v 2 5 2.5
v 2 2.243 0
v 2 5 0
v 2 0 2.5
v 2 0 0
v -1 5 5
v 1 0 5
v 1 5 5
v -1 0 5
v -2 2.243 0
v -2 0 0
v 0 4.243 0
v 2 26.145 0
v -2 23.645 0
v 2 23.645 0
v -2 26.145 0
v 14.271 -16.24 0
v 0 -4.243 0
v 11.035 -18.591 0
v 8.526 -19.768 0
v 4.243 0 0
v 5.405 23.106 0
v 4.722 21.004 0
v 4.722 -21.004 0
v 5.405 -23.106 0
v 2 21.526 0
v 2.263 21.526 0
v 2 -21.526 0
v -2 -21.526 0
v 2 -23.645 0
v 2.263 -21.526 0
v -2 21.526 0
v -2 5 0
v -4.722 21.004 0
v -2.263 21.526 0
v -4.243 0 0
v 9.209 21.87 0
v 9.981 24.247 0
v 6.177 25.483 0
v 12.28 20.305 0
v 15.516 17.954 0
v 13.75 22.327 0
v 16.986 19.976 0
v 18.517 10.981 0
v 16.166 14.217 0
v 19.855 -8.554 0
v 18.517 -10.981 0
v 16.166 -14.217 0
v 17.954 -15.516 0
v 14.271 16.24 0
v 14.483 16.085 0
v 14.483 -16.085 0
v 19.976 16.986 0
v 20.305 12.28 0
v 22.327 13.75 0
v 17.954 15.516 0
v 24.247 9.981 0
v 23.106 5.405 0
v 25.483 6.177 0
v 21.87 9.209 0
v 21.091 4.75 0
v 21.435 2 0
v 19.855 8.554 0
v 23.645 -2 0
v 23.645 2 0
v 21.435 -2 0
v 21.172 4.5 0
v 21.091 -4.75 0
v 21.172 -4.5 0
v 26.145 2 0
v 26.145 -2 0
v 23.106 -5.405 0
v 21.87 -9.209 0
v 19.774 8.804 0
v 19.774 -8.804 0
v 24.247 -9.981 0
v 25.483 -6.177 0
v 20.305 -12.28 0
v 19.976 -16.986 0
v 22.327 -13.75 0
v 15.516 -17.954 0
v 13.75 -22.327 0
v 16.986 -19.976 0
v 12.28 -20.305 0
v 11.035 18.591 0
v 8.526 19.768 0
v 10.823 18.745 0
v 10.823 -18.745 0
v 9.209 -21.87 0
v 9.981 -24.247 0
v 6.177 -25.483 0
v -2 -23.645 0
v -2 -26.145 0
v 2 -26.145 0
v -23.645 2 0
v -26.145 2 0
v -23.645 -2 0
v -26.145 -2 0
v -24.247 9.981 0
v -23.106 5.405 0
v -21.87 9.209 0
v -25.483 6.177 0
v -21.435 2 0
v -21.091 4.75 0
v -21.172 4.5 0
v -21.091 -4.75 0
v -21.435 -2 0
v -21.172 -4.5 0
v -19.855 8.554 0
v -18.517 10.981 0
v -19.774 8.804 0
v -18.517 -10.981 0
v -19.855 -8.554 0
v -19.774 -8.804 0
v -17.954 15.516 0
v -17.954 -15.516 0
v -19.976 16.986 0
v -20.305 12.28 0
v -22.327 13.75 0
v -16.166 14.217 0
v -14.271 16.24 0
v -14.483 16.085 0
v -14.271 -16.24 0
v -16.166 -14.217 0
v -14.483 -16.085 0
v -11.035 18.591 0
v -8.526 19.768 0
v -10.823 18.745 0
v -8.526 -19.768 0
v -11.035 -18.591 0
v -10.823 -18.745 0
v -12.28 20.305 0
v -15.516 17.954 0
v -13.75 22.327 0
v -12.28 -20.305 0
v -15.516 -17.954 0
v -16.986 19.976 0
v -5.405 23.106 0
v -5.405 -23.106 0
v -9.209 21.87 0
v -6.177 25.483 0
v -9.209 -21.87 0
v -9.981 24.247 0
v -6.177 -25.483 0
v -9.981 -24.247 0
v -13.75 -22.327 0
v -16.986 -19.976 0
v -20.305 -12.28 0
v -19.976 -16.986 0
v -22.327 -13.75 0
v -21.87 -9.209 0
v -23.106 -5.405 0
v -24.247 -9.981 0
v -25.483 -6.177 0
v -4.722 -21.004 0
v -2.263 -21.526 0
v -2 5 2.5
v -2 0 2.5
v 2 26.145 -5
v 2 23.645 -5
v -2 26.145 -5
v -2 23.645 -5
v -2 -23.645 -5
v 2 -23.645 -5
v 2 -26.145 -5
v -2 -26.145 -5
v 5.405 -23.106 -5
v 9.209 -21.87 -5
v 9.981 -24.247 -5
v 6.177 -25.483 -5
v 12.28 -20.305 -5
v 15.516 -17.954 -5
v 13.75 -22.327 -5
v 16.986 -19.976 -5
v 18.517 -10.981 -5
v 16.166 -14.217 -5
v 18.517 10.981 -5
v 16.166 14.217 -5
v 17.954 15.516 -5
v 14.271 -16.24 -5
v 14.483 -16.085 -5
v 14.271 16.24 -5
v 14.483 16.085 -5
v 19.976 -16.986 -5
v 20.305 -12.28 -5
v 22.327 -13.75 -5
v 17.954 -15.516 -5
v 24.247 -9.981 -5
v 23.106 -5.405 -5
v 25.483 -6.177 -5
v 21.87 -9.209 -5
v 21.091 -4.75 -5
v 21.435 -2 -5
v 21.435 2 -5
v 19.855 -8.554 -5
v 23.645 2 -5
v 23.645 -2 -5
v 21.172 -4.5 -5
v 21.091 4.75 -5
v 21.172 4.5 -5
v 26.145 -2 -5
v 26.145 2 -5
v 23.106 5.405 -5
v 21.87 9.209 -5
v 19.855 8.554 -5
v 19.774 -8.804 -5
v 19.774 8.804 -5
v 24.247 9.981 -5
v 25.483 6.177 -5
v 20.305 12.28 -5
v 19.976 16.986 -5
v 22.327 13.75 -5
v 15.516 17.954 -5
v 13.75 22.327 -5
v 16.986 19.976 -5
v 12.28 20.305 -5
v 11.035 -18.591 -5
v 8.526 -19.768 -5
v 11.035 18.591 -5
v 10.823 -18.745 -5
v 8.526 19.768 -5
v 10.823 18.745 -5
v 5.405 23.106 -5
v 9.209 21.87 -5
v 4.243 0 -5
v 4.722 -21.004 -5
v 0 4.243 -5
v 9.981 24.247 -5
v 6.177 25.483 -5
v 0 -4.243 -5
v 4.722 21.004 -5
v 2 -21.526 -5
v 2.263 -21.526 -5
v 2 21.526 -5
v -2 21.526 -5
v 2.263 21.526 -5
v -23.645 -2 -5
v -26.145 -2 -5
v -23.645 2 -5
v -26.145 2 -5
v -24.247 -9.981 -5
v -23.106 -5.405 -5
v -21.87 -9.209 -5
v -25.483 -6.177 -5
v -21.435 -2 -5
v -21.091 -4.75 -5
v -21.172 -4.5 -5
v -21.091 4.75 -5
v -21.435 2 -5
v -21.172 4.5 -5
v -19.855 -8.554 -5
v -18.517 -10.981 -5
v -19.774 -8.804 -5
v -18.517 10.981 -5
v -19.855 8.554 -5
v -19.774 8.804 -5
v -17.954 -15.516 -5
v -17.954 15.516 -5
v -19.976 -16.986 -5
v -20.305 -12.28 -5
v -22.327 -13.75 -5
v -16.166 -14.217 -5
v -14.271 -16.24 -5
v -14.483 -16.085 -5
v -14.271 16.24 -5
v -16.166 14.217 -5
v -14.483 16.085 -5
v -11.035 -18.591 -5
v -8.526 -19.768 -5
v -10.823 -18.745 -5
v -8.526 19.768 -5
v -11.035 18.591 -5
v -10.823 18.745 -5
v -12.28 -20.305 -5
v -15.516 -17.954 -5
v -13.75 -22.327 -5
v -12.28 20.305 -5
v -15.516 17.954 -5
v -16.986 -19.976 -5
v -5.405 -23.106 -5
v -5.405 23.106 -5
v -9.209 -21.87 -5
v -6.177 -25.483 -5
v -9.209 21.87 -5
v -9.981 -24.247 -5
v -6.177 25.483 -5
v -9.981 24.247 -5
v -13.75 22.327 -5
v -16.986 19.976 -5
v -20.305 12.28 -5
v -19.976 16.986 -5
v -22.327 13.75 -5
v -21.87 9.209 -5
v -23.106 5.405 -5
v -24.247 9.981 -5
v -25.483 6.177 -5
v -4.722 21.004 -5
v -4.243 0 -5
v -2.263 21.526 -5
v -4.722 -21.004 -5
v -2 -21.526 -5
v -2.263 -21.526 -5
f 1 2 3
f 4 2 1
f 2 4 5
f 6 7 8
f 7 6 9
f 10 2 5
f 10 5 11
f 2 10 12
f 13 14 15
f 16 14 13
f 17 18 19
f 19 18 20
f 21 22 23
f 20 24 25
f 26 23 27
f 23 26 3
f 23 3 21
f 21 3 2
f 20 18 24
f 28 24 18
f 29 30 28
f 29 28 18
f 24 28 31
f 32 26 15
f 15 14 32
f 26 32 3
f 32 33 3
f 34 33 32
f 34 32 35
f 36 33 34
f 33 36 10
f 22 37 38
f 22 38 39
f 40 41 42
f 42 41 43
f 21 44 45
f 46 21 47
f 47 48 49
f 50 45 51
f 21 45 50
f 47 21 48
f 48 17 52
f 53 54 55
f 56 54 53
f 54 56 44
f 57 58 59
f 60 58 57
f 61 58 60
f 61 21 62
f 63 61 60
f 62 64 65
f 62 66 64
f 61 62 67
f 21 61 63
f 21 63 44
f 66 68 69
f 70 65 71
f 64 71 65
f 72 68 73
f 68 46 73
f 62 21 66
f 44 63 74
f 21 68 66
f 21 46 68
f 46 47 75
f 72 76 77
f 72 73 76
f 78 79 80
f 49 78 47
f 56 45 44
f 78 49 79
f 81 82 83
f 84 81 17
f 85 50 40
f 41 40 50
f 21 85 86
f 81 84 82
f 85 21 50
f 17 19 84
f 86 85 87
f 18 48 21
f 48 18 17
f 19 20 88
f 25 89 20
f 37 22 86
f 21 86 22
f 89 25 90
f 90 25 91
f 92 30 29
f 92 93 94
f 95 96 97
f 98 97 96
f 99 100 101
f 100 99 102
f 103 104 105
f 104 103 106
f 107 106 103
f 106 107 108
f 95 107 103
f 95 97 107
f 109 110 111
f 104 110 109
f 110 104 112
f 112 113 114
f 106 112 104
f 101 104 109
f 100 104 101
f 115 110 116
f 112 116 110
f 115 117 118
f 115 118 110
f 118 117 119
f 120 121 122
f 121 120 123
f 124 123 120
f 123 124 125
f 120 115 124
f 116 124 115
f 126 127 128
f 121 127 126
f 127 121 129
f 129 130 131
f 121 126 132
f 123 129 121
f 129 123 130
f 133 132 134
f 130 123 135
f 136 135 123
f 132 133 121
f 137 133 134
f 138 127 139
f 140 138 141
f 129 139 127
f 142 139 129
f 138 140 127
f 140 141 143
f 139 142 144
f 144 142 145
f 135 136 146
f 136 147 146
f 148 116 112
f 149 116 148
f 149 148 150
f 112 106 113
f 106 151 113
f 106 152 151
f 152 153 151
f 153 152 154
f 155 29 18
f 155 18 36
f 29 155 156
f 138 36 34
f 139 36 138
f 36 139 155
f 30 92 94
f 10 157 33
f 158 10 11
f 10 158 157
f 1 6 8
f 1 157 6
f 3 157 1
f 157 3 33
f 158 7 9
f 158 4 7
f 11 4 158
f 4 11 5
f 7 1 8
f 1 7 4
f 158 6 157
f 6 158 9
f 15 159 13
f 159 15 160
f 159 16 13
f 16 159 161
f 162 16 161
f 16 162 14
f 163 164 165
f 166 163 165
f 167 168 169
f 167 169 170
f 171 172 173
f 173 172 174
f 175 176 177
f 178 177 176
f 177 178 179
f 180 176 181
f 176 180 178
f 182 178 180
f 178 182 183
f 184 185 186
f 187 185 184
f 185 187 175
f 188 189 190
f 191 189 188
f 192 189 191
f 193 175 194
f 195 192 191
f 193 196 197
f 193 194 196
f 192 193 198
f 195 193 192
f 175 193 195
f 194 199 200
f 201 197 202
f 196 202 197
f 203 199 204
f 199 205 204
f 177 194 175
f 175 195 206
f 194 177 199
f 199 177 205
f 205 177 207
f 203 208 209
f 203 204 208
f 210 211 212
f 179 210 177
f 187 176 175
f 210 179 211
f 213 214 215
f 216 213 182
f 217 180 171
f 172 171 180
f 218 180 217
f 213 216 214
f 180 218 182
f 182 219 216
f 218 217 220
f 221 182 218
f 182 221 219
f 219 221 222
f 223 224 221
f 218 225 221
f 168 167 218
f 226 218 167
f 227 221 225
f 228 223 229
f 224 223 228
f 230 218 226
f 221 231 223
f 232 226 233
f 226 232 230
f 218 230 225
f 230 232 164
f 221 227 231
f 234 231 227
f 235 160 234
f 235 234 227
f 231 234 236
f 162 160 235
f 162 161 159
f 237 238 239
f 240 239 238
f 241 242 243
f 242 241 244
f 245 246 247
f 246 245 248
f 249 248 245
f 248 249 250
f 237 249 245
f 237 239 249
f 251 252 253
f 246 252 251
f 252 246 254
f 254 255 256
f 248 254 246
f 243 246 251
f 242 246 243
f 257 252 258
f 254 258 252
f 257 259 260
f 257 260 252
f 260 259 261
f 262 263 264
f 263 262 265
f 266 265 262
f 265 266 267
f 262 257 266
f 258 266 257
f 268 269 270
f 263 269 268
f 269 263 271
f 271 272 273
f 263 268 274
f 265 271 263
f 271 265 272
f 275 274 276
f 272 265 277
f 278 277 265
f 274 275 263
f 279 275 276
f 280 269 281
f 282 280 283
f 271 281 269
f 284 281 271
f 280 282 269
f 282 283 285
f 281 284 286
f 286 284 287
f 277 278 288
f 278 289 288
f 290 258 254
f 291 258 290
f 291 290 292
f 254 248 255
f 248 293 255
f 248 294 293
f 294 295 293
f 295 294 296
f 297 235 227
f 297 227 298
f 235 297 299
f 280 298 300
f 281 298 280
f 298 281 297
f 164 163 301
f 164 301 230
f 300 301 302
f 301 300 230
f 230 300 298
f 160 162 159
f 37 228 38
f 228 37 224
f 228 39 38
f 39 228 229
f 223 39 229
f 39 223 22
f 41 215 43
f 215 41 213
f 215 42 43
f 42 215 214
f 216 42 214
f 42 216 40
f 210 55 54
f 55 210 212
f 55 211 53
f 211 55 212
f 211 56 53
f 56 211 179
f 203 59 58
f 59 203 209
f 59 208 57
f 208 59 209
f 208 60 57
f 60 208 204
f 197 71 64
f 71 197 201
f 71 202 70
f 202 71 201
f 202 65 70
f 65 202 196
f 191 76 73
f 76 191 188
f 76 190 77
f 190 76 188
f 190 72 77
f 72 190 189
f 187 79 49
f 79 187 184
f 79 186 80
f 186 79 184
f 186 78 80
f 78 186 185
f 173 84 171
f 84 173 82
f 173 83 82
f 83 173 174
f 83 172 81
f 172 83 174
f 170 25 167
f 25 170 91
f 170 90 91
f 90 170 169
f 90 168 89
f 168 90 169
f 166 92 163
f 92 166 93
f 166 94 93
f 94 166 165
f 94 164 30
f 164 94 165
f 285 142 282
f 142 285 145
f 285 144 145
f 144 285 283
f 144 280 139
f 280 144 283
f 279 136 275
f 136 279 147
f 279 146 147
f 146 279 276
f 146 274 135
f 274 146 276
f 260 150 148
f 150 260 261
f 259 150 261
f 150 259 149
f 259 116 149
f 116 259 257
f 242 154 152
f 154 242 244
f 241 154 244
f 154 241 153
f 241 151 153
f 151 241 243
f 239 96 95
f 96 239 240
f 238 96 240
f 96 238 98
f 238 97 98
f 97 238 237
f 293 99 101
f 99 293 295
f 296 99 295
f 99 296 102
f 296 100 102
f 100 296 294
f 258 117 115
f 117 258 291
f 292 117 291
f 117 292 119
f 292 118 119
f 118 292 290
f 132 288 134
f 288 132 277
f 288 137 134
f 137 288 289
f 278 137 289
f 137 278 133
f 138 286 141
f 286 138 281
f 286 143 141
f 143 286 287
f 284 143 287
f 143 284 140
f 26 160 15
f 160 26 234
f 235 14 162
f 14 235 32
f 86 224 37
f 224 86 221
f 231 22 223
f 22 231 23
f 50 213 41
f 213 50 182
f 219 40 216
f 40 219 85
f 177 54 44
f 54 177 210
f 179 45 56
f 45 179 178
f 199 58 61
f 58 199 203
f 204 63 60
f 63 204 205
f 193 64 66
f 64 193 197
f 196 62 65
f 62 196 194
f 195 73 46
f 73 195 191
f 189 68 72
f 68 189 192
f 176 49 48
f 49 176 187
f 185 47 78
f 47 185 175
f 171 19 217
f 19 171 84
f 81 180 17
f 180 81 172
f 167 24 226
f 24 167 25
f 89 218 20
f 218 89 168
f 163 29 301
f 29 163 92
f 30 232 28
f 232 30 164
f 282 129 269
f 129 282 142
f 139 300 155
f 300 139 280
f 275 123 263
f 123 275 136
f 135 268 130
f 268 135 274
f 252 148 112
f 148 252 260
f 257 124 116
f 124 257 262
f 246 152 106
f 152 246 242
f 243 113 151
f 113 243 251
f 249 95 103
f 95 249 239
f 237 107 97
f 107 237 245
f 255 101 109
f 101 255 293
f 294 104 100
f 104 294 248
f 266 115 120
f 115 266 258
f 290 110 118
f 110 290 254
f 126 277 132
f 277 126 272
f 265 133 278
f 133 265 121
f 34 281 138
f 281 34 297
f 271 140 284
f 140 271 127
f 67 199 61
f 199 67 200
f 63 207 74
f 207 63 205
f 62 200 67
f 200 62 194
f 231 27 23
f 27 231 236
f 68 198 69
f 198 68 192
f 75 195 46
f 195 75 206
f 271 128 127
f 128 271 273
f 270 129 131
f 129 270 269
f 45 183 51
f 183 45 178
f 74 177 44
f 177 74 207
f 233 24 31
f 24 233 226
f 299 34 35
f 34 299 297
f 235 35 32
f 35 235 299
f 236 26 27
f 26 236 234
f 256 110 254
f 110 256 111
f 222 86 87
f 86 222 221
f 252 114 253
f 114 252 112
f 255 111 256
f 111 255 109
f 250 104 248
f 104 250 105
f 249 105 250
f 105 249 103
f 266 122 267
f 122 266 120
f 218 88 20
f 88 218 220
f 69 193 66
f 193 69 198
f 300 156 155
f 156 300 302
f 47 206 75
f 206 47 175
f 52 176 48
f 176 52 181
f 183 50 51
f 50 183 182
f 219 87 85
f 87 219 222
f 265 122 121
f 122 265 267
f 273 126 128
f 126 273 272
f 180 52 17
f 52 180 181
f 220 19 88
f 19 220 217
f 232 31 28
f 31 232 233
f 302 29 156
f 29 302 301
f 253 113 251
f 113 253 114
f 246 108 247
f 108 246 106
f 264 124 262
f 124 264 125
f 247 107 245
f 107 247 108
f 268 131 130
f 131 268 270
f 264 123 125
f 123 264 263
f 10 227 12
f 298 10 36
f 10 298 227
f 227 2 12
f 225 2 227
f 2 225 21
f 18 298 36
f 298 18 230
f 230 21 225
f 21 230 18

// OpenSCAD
/* the original one was posted by by Entropic
 * on Jan 30, 2015; 5:25pm,  on OpenSCAD official forum
 *
 * License? by official author:
 * "Also I thought that someone might benefit from this if they aren't able to make a gear themselves."
 *
 */

numberOfTeeth = 20;
widthOfTeeth = 4;
heightOfTeeth = 5;
thicknessOfGear = 5;
radiusOfHoleForShaft = 4.242640687;  //If shaft is square, find the square of one side,
sidesOfShaft = 4;                    //multiply by two and then square root that to get radius
//diameter = ((teethNo x 1.7 x teethWidth)/pi)+ 2teethHeight

module tooth(width, thickness, height){
  scale([width/5,thickness/5,height/10]){
    difference(){
      translate([-2.5,0,0])
      cube([5,5,10]);
      translate([5+1.25-2.5,0-1,0])
      rotate([0,-14.0362434,0])
        cube([5,5+2,12]);
      translate([0-1.25-2.5,0+5+1,0])
      rotate([0,-14.0362434,180])
        cube([5,5+2,12]);
    }
  }
}
module gear(toothNo, toothWidth, toothHeight, thickness,holeRadius,holeSides){
  radius = (toothWidth*1.7*toothNo)/3.141592653589793238/2;
  rotate([-90,0,0])
  difference(){
    union(){
      for(i=[0:toothNo]){
        rotate([0,(360/toothNo)*i,0])
        translate([0,0,radius-0.5])
          tooth(toothWidth,thickness,toothHeight);
      }
      translate([0,thickness,0])
      rotate([90,0,0])
        cylinder(r=radius, h=thickness);
    }
  translate([0,thickness+1,0])
  rotate([90,0,0])
    cylinder(r=holeRadius,h=thickness+2,$fn=holeSides);
  }
}

module gearInside(toothNo, toothWidth, toothHeight, thickness,holeRadius,holeSides){
  radius = (toothWidth*1.7*toothNo)/3.141592653589793238/2;
  rotate([-90,0,0])
//  difference(){
    union(){
      for(i=[0:toothNo]){
        rotate([0,(360/toothNo)*i,0])
        translate([0,0,radius-0.5])
            mirror([0,0,1])
                translate([0,0,-toothHeight]) 
                    tooth(toothWidth,thickness,toothHeight);
      }
    }
//  translate([0,thickness+1,0])
//  rotate([90,0,0])
//    cylinder(r=holeRadius,h=thickness+2,$fn=holeSides);
//  }
}


//gear(numberOfTeeth,widthOfTeeth,heightOfTeeth,thicknessOfGear,radiusOfHoleForShaft,sidesOfShaft);

gearInside(numberOfTeeth,widthOfTeeth,heightOfTeeth,thicknessOfGear,radiusOfHoleForShaft,sidesOfShaft);

// tooth(toothWidth,thickness,toothHeight);

tooth(widthOfTeeth,thicknessOfGear,heightOfTeeth);

numberOfTeeth = 20;
widthOfTeeth = 4;
heightOfTeeth = 5;
thicknessOfGear = 5;
radiusOfHoleForShaft = 4.242640687;  //If shaft is square, find the square of one side,
sidesOfShaft = 4;                    //multiply by two and then square root that to get radius
//diameter = ((teethNo x 1.7 x teethWidth)/pi)+ 2teethHeight

module tooth(width, thickness, height){
  scale([width/5,thickness/5,height/10]){
    difference(){
      translate([-2.5,0,0])
      cube([5,5,10]);
      translate([5+1.25-2.5,0-1,0])
      rotate([0,-14.0362434,0])
        cube([5,5+2,12]);
      translate([0-1.25-2.5,0+5+1,0])
      rotate([0,-14.0362434,180])
        cube([5,5+2,12]);
    }
  }
}
module gear(toothNo, toothWidth, toothHeight, thickness,holeRadius,holeSides){
  radius = (toothWidth*1.7*toothNo)/3.141592653589793238/2;
  rotate([-90,0,0])
  difference(){
    union(){
      for(i=[0:toothNo]){
        rotate([0,(360/toothNo)*i,0])
        translate([0,0,radius-0.5])
          tooth(toothWidth,thickness,toothHeight);
      }
      translate([0,thickness,0])
      rotate([90,0,0])
        cylinder(r=radius, h=thickness);
    }
  translate([0,thickness+1,0])
  rotate([90,0,0])
    cylinder(r=holeRadius,h=thickness+2,$fn=holeSides);
  }
}

gear(numberOfTeeth,widthOfTeeth,heightOfTeeth,thicknessOfGear,radiusOfHoleForShaft,sidesOfShaft);
